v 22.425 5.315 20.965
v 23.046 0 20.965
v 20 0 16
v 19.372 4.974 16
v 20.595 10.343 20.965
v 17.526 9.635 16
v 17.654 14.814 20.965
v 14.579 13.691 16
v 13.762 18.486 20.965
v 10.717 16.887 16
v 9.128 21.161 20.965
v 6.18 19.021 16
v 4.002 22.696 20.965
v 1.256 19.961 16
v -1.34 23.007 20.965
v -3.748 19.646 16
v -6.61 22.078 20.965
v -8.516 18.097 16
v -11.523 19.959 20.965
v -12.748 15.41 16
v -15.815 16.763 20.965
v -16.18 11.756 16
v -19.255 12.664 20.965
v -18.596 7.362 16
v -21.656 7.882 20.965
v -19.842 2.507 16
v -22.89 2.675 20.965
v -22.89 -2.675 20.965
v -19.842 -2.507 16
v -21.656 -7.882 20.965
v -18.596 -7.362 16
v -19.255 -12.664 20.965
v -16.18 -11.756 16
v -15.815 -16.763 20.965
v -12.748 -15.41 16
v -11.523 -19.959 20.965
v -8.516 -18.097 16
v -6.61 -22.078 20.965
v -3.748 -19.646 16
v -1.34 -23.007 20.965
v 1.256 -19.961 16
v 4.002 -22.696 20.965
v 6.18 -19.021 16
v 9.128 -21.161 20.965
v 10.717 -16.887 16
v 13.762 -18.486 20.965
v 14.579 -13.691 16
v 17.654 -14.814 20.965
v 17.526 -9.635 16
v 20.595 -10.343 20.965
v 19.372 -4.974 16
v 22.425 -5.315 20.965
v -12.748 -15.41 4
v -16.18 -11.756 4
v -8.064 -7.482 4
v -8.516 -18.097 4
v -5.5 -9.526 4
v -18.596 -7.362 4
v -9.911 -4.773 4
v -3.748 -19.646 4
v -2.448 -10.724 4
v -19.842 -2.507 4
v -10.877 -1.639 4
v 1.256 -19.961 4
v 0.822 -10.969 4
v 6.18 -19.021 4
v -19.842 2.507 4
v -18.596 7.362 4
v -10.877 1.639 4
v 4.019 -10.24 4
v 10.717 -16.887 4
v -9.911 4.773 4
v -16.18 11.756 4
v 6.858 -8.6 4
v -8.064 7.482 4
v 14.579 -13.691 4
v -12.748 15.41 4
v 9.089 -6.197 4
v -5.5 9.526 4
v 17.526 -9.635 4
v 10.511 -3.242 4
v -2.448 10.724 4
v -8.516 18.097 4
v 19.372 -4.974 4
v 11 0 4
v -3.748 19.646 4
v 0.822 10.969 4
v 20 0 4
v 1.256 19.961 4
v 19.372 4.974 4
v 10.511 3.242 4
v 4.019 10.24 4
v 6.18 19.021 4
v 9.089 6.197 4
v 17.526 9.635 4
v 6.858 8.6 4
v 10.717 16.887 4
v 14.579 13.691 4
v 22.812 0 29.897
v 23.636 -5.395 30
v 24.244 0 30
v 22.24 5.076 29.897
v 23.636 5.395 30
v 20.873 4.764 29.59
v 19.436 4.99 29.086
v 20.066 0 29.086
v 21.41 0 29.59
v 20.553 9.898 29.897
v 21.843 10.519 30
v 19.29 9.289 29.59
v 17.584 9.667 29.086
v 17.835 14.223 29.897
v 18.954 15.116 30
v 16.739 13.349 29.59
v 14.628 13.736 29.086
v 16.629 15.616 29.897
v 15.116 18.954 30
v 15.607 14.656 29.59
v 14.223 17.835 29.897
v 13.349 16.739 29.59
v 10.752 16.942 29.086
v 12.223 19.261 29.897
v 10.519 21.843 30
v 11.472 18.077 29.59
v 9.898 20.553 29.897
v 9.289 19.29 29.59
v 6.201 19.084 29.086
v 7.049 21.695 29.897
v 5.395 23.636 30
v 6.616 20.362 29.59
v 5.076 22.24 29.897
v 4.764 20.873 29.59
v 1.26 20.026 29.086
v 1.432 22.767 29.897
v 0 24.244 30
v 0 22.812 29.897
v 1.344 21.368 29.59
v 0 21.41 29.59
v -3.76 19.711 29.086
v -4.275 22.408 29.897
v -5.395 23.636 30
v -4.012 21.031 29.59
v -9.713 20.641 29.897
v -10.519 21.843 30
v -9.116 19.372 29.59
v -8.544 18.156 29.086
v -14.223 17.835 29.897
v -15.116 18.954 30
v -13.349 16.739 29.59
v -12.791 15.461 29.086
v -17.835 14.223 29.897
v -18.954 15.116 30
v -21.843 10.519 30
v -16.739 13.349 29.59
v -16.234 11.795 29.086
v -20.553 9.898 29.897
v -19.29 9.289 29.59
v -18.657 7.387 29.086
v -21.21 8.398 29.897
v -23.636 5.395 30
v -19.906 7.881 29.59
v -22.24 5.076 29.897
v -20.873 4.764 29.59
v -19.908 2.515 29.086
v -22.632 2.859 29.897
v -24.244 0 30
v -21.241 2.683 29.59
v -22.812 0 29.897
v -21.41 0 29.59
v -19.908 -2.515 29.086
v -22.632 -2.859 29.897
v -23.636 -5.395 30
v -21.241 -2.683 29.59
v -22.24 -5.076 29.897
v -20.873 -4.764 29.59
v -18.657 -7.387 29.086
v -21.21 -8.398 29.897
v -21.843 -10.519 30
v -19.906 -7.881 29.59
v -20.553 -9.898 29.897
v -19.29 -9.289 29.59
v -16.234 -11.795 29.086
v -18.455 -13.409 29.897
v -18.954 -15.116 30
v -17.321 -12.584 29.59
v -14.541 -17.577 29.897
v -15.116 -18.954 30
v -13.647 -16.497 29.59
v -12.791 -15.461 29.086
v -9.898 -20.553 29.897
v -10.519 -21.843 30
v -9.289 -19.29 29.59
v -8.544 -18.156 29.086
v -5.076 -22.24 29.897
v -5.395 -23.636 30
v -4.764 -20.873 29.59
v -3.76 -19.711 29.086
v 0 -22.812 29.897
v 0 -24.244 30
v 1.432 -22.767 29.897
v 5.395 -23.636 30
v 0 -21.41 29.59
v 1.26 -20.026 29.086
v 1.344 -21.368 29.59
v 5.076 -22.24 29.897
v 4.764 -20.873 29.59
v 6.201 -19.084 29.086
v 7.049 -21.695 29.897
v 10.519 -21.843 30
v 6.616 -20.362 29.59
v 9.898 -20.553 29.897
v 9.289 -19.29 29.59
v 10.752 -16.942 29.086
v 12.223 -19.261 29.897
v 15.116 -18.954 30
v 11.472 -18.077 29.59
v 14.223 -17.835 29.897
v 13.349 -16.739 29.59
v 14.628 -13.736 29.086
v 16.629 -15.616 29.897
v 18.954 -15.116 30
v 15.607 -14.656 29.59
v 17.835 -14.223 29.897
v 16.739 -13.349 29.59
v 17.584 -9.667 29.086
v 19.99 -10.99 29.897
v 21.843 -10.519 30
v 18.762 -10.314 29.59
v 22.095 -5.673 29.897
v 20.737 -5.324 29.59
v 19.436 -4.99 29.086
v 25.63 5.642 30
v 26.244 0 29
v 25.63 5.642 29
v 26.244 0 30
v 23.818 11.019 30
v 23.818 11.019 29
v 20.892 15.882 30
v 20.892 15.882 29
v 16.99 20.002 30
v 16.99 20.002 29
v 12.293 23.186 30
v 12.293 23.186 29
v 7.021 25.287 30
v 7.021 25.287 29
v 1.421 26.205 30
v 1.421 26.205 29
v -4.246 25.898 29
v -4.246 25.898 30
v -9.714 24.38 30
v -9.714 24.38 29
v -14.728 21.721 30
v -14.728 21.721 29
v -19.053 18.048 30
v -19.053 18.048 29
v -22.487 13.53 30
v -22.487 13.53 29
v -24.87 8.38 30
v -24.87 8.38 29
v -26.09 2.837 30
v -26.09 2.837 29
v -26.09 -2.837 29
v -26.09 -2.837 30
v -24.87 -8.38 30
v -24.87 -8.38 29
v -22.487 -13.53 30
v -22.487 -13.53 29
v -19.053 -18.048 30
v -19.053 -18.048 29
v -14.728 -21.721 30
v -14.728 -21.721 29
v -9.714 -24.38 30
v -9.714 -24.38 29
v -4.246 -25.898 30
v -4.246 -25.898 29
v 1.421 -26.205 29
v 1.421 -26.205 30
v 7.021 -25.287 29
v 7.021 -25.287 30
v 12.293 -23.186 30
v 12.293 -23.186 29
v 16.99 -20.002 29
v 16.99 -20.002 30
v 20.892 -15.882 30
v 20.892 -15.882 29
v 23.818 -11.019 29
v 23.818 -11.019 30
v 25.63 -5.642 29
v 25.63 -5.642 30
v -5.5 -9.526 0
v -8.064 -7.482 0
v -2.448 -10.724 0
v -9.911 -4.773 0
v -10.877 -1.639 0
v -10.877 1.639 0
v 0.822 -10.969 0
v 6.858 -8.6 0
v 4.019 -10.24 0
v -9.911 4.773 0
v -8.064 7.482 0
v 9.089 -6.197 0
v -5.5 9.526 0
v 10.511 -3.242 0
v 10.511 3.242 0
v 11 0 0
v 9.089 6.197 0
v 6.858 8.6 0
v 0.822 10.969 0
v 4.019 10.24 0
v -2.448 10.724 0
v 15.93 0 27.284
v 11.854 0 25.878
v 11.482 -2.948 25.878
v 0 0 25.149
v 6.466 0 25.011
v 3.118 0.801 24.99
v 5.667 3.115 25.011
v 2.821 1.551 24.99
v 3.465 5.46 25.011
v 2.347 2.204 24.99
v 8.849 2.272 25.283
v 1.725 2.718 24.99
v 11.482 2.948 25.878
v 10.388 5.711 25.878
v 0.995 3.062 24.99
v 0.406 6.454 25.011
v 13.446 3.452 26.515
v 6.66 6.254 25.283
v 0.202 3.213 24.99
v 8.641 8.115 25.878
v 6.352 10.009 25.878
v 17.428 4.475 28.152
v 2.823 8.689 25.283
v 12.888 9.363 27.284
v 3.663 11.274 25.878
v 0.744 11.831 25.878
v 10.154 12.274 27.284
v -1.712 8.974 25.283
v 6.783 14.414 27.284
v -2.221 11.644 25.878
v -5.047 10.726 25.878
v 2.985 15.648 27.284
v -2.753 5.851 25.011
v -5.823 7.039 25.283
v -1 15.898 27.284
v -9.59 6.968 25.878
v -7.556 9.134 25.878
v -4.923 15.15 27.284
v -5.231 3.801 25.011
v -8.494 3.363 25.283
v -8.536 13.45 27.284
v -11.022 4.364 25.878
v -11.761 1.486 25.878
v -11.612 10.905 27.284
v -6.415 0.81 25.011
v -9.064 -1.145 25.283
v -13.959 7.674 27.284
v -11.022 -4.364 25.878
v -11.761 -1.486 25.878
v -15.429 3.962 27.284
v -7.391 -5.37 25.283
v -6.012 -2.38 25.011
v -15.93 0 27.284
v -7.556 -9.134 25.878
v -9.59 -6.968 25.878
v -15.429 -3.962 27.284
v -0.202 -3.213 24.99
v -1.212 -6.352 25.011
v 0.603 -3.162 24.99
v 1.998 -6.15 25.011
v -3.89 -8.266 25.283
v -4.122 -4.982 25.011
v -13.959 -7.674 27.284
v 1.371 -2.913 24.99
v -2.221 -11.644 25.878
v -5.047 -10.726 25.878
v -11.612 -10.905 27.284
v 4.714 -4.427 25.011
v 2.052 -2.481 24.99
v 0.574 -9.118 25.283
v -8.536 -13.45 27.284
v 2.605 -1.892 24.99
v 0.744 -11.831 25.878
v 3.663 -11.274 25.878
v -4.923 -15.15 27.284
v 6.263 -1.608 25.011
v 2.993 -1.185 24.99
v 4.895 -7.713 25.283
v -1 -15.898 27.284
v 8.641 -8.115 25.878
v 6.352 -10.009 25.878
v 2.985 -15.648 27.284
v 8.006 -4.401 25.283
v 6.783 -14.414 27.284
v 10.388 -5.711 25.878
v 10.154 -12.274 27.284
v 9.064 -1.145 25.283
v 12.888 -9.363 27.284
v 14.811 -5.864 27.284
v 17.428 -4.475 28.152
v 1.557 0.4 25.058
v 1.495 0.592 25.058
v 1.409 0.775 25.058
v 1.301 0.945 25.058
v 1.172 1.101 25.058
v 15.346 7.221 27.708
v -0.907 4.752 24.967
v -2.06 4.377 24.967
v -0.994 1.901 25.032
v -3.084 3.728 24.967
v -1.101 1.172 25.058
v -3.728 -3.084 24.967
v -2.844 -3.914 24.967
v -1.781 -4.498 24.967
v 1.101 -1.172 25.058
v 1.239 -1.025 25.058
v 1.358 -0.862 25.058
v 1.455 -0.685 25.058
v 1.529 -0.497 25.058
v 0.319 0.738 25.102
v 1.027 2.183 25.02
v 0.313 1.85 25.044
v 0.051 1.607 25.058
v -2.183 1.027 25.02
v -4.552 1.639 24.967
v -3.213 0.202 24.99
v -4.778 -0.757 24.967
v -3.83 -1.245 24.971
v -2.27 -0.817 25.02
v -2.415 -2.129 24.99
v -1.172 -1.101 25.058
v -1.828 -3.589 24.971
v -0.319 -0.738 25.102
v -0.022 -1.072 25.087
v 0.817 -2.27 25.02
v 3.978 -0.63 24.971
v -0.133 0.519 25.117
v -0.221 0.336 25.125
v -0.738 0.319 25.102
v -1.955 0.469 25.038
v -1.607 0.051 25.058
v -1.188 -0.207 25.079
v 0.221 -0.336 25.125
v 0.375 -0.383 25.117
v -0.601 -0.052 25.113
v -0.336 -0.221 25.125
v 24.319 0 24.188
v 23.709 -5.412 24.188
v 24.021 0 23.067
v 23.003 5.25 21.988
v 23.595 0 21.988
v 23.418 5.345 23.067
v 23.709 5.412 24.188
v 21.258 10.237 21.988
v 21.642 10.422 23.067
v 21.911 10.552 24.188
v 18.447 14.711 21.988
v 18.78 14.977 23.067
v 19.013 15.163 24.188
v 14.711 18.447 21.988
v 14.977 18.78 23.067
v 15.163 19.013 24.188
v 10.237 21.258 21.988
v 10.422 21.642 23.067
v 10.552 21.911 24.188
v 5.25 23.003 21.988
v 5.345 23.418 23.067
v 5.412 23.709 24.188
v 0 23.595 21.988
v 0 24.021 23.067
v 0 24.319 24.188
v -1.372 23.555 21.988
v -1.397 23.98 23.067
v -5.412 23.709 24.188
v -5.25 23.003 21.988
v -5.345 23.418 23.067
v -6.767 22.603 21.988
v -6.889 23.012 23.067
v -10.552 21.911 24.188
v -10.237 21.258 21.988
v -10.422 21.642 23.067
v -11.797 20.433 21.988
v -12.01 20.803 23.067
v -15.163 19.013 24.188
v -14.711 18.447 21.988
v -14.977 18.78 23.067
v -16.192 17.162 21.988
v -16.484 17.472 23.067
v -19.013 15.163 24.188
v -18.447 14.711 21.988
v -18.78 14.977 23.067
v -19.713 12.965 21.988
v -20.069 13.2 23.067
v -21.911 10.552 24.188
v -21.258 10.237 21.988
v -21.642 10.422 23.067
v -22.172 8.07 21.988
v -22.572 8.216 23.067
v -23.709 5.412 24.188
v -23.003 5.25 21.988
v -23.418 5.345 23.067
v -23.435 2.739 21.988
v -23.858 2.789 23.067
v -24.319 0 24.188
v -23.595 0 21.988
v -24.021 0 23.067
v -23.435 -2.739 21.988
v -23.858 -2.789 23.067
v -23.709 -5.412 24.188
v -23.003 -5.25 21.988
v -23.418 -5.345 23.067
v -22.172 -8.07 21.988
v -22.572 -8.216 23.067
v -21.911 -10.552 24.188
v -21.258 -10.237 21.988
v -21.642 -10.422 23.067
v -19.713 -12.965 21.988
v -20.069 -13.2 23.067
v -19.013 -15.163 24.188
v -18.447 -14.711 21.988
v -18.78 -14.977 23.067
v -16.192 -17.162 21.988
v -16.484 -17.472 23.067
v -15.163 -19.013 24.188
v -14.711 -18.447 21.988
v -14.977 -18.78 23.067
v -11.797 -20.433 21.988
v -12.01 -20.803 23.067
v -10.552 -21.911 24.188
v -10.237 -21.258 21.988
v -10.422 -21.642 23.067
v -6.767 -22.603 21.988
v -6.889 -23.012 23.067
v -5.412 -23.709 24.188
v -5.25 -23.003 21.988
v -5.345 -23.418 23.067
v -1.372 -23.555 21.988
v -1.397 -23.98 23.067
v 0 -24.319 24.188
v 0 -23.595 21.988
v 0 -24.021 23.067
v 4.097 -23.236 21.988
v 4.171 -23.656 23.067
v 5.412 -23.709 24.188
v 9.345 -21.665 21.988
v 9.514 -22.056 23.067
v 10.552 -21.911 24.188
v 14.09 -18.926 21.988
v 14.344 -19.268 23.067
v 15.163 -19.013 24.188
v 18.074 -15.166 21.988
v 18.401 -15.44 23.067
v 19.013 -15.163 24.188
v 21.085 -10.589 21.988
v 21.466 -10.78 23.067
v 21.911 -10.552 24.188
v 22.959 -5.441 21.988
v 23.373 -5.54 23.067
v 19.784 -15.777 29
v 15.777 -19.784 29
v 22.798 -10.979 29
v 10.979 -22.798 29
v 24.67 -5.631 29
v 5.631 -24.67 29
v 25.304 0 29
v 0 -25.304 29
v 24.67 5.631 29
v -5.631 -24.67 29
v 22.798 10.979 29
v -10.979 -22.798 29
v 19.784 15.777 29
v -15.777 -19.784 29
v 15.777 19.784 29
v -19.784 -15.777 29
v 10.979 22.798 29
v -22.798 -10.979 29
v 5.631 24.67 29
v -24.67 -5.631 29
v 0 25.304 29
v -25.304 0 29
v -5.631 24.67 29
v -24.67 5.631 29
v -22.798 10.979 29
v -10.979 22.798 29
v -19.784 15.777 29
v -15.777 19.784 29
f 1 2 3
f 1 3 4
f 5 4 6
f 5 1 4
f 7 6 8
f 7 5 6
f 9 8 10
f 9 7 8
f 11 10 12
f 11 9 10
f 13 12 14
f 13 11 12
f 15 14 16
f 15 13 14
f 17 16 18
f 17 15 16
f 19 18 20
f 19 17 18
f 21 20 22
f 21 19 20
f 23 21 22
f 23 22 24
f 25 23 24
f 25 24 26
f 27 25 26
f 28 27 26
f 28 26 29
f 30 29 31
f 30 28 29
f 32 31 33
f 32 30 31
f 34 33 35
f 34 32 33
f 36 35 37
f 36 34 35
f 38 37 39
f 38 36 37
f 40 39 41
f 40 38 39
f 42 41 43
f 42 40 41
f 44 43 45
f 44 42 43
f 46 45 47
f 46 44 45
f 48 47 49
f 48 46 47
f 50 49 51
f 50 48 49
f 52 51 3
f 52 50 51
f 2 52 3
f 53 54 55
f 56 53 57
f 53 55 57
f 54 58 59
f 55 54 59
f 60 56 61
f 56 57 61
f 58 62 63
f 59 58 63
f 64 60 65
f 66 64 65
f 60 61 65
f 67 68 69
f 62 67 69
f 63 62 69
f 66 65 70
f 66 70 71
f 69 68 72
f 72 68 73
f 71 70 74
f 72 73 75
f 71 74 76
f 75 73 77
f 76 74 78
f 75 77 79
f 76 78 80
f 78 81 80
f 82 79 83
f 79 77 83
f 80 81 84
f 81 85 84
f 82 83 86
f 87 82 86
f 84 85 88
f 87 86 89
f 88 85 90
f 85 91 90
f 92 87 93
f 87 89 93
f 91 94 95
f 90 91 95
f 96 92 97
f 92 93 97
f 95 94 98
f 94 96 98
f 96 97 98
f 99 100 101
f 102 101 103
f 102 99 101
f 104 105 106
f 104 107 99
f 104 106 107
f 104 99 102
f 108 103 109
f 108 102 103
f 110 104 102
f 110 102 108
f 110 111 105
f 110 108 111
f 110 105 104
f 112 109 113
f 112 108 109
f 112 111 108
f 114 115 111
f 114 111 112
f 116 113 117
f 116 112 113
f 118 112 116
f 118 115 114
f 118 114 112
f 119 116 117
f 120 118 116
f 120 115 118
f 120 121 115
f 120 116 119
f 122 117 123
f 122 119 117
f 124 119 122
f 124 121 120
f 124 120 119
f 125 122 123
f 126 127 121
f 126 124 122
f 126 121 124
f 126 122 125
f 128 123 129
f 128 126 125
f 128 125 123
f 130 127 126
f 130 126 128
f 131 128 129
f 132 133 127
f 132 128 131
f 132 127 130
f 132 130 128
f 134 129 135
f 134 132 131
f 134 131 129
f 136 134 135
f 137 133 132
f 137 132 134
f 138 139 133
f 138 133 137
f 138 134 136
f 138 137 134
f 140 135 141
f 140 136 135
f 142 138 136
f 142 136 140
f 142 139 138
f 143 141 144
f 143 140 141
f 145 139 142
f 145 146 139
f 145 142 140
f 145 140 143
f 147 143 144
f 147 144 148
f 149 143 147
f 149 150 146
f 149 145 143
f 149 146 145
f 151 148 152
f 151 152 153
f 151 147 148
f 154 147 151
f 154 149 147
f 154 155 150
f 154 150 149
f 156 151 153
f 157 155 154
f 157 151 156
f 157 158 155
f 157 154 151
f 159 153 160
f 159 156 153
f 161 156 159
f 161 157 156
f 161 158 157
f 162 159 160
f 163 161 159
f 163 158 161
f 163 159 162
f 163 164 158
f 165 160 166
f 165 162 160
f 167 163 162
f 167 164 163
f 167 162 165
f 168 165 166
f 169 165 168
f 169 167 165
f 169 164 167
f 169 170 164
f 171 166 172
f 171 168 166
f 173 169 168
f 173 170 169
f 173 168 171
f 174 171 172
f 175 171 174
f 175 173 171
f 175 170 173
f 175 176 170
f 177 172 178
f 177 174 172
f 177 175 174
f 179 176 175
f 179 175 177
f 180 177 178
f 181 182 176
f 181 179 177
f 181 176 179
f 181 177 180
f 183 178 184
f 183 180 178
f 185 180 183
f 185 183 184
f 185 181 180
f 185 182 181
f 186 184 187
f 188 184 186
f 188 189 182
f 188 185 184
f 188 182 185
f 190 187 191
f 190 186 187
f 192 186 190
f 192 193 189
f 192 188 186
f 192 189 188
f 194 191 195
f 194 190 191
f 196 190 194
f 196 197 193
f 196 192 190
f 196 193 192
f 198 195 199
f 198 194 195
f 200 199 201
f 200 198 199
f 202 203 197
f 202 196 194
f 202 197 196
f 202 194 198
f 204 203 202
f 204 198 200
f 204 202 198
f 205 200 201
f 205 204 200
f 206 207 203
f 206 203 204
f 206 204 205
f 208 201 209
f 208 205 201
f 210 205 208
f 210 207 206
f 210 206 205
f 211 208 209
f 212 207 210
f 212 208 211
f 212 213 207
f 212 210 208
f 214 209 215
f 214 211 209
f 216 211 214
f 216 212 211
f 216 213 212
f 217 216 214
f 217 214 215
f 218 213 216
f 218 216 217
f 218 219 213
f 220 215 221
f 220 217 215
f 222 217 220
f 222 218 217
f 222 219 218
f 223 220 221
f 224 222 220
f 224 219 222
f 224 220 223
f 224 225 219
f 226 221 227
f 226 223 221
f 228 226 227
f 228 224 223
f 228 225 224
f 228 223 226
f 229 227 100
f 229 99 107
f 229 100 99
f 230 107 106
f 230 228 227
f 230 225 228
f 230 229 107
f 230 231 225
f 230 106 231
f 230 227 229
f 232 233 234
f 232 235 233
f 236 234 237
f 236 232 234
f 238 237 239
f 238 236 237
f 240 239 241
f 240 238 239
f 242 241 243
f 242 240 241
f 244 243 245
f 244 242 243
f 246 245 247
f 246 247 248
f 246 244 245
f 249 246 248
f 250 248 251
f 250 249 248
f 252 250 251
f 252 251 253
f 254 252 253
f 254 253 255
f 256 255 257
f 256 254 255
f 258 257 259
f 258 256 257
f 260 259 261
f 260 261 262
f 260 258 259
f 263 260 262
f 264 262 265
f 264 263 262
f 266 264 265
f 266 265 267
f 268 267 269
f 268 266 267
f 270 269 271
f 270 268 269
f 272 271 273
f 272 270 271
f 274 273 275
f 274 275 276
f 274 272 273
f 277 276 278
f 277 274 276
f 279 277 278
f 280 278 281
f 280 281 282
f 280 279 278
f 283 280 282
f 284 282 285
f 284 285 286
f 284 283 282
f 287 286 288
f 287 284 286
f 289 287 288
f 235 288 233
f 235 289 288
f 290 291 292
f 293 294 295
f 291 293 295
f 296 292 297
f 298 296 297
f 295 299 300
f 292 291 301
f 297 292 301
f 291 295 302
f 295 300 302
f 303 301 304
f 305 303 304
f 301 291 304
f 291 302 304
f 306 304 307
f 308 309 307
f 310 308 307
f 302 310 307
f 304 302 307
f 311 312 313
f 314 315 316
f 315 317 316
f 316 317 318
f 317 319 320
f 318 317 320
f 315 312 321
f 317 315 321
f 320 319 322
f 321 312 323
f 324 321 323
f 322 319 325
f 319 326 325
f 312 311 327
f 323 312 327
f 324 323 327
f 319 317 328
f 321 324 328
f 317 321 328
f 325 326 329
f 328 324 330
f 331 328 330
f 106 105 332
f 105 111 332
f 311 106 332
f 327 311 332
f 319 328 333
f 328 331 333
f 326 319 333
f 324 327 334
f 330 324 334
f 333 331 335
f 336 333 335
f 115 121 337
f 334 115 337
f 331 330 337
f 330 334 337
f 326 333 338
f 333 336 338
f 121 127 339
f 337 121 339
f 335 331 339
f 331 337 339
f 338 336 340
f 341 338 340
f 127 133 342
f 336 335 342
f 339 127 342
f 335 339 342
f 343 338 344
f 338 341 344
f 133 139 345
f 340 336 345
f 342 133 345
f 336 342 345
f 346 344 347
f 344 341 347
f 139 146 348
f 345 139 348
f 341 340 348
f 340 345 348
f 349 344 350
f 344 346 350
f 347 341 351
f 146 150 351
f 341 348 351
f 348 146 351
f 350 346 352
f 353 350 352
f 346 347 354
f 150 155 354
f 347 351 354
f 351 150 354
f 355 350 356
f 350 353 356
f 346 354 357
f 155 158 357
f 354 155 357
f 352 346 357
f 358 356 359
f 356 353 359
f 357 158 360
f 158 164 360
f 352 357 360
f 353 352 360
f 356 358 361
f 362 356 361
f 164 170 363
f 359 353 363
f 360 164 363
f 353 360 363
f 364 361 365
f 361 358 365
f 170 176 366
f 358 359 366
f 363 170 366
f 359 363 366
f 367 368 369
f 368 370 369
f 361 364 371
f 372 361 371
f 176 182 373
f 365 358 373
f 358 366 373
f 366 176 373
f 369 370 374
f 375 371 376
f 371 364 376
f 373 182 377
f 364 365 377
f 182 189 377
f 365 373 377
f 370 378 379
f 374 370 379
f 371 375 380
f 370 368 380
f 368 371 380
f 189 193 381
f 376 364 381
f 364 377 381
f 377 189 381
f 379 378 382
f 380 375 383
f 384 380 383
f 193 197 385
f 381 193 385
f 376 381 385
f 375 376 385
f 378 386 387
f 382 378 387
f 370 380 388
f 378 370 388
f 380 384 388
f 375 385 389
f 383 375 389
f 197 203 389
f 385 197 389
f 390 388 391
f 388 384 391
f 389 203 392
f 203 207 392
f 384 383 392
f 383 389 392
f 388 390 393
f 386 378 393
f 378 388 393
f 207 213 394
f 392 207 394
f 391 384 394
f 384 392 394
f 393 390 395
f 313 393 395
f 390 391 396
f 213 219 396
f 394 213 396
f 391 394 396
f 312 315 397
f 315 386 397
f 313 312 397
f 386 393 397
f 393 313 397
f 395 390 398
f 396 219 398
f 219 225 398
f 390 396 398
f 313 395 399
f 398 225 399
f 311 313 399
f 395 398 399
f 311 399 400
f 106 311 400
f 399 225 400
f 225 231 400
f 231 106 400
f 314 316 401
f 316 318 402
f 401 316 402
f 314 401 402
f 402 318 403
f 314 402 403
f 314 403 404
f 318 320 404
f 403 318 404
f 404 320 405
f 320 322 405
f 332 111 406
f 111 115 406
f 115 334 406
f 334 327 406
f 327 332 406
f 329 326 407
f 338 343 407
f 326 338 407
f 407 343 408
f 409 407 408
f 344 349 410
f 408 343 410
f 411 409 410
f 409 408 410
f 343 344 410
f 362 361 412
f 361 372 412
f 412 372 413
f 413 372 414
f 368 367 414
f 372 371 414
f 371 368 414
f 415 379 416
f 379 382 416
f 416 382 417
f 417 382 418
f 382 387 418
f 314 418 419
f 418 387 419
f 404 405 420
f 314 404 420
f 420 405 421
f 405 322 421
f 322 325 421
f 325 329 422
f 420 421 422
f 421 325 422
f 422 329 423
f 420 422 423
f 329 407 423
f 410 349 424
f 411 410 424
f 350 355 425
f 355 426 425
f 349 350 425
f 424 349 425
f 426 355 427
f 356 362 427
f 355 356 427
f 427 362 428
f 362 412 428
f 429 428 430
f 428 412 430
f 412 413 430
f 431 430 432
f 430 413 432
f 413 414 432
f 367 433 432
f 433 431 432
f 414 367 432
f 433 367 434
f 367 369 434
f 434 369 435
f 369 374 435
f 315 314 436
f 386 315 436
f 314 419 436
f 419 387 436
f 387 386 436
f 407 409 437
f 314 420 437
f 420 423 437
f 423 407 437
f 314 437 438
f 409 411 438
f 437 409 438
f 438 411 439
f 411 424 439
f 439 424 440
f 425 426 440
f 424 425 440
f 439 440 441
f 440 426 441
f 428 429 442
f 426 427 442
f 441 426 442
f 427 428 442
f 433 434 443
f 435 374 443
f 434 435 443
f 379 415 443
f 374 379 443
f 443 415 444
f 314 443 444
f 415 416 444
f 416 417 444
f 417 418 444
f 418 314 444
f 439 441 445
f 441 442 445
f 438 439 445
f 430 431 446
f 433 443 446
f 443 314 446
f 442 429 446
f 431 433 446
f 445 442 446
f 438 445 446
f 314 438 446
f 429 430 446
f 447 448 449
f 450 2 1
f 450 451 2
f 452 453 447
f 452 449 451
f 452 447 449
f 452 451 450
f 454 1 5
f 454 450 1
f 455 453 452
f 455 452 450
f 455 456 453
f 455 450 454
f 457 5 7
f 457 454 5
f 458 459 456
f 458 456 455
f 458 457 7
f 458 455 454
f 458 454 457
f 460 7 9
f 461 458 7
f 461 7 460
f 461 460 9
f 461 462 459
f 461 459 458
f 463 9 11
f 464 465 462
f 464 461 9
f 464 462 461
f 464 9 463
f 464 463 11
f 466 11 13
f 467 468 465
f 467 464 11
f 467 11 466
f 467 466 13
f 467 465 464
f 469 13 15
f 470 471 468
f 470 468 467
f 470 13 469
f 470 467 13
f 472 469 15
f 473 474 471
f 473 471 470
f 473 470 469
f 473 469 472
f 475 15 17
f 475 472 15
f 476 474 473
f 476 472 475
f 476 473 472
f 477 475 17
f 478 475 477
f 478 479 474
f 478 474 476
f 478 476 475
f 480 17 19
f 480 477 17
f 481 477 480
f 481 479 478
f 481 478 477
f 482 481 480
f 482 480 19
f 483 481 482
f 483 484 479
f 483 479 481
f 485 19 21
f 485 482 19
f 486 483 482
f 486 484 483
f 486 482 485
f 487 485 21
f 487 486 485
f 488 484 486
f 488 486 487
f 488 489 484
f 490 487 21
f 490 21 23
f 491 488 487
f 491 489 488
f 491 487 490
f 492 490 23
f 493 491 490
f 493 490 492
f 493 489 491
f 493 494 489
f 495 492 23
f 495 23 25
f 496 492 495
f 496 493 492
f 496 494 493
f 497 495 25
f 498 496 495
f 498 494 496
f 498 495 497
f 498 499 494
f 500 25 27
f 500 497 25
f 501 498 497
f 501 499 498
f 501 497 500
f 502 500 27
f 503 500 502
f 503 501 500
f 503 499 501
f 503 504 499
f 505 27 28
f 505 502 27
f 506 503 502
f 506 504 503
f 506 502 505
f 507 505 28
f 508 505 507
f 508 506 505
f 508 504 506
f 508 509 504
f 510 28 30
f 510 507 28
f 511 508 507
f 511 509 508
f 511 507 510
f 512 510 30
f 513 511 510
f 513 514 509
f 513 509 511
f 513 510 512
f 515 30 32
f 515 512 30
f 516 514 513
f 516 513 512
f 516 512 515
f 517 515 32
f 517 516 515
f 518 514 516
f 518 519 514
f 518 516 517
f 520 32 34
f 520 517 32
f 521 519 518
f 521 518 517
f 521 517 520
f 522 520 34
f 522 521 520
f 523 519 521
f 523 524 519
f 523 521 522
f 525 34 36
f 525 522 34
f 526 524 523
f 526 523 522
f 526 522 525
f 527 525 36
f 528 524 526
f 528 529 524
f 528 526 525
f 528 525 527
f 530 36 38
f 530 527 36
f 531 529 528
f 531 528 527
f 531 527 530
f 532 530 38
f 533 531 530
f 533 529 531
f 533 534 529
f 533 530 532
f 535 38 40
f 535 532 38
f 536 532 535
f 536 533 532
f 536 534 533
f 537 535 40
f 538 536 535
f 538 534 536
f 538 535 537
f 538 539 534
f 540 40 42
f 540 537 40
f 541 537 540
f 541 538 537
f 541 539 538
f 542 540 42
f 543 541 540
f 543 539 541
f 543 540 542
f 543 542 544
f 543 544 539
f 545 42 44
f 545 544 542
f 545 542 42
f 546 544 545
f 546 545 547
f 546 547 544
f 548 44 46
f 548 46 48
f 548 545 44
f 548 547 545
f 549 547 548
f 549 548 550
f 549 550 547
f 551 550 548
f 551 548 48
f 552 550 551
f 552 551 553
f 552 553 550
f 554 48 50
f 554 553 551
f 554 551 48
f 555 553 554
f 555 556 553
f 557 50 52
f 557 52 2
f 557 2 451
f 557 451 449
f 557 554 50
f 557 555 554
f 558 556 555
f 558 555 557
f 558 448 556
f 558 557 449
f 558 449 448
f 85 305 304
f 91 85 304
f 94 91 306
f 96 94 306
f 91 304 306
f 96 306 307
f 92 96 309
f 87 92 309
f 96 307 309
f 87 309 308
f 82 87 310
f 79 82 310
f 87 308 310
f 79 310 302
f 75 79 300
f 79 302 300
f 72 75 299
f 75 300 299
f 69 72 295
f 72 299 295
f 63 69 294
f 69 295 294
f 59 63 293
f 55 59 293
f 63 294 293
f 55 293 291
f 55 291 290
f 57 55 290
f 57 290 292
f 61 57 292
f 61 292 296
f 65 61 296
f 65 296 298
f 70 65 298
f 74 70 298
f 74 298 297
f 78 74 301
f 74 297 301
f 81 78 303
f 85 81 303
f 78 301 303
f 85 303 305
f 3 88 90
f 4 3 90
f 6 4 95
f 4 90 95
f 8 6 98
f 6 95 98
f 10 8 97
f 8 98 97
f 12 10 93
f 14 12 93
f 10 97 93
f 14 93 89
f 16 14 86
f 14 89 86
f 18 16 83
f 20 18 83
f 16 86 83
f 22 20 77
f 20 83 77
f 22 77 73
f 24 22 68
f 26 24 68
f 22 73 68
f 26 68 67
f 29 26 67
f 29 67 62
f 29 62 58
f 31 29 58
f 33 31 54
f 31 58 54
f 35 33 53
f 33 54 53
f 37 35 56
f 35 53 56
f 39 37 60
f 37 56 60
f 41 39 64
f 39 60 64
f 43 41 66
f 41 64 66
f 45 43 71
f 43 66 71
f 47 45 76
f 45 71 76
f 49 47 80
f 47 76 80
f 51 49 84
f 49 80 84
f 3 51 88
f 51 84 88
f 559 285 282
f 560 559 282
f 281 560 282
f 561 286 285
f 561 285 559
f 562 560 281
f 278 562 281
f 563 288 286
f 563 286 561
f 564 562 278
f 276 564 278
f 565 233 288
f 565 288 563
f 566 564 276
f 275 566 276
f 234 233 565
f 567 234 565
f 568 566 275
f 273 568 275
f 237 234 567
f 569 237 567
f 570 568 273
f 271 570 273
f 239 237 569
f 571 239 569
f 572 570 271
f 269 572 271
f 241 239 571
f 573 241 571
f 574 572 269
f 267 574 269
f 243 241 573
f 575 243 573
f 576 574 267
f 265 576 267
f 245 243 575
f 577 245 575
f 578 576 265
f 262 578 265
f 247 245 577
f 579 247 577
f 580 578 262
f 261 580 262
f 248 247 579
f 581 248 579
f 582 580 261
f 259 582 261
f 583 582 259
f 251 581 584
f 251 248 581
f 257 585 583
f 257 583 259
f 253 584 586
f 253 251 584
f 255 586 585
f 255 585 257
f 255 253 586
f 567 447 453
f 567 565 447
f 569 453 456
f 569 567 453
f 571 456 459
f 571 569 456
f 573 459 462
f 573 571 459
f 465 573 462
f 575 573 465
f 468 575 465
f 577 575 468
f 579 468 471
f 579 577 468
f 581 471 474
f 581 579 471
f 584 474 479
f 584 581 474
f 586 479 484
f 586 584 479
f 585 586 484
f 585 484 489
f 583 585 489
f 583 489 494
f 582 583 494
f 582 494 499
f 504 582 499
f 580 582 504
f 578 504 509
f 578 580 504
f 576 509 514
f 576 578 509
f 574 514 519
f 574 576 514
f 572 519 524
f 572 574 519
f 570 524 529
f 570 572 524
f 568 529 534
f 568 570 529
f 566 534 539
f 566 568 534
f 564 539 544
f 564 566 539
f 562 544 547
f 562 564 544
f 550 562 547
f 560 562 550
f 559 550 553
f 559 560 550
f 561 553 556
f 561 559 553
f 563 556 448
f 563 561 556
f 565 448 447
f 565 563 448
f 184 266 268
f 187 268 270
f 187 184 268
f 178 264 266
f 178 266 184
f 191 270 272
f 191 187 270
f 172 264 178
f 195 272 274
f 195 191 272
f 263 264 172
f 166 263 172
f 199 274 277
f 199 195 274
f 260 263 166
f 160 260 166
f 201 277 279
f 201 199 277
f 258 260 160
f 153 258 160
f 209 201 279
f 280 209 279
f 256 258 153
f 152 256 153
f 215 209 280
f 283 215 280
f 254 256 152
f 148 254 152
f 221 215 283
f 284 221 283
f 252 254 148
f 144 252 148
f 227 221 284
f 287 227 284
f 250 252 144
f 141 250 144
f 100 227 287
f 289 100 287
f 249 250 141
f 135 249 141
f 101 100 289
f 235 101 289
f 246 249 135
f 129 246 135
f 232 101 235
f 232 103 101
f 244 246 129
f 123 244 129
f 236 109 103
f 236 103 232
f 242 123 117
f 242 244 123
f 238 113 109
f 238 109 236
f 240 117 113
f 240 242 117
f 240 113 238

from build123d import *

# Parameters (mm, degrees)
F0_R     = 11
F1_DEPTH = 4
F2_R     = 20
F2_R_2   = 11
F3_DEPTH = 12


with BuildPart() as f1:
    # F0 (on Top) → F1 (new body)
    with BuildSketch(Plane.XY):
        Circle(F0_R)
    extrude(amount=F1_DEPTH)

    # F2 (on face) → F3 (join)
    with BuildSketch(Plane.XY.offset(4)):
        Circle(F2_R)
        Circle(F2_R_2, mode=Mode.SUBTRACT)
        Circle(F2_R_2)
    extrude(amount=F3_DEPTH)

    # F4 (on Front) → F5 (revolve)
    with BuildSketch(Plane.XZ):
        with BuildLine():
            Line((26.2435501542, 30), (24.2435501542, 30))
            ThreePointArc((24.2435501542, 30), (22.1053432538, 29.7687292547), (20.066037294, 29.0856142502))
            add(Edge.make_bspline(
                [(0, 25.1485239714), (3.3020219353, 24.9547299716), (9.7317137995, 24.5773746031), (16.670969278, 27.5245816212), (20.066037294, 29.0856142502)],
                knots=[0, 0, 0, 0, 0.4694356931, 0.9140844354, 0.9140844354, 0.9140844354, 0.9140844354], degree=3))
            Line((0, 25.1485239714), (0, 16))
            Line((0, 16), (20, 16))
            Line((20, 16), (23.0461187635, 20.9651674984))
            ThreePointArc((23.0461187635, 20.9651674984), (23.82328384, 22.5212025281), (24.3190746637, 24.1883623971))
            Line((24.3190746637, 24.1883623971), (25.3043714911, 29))
            Line((25.3043714911, 29), (26.2435501542, 29))
            Line((26.2435501542, 29), (26.2435501542, 30))
        make_face()
    revolve(axis=Axis((0, 0, 21.7276830226), (0, 0, 1)))


solid = f1.part
